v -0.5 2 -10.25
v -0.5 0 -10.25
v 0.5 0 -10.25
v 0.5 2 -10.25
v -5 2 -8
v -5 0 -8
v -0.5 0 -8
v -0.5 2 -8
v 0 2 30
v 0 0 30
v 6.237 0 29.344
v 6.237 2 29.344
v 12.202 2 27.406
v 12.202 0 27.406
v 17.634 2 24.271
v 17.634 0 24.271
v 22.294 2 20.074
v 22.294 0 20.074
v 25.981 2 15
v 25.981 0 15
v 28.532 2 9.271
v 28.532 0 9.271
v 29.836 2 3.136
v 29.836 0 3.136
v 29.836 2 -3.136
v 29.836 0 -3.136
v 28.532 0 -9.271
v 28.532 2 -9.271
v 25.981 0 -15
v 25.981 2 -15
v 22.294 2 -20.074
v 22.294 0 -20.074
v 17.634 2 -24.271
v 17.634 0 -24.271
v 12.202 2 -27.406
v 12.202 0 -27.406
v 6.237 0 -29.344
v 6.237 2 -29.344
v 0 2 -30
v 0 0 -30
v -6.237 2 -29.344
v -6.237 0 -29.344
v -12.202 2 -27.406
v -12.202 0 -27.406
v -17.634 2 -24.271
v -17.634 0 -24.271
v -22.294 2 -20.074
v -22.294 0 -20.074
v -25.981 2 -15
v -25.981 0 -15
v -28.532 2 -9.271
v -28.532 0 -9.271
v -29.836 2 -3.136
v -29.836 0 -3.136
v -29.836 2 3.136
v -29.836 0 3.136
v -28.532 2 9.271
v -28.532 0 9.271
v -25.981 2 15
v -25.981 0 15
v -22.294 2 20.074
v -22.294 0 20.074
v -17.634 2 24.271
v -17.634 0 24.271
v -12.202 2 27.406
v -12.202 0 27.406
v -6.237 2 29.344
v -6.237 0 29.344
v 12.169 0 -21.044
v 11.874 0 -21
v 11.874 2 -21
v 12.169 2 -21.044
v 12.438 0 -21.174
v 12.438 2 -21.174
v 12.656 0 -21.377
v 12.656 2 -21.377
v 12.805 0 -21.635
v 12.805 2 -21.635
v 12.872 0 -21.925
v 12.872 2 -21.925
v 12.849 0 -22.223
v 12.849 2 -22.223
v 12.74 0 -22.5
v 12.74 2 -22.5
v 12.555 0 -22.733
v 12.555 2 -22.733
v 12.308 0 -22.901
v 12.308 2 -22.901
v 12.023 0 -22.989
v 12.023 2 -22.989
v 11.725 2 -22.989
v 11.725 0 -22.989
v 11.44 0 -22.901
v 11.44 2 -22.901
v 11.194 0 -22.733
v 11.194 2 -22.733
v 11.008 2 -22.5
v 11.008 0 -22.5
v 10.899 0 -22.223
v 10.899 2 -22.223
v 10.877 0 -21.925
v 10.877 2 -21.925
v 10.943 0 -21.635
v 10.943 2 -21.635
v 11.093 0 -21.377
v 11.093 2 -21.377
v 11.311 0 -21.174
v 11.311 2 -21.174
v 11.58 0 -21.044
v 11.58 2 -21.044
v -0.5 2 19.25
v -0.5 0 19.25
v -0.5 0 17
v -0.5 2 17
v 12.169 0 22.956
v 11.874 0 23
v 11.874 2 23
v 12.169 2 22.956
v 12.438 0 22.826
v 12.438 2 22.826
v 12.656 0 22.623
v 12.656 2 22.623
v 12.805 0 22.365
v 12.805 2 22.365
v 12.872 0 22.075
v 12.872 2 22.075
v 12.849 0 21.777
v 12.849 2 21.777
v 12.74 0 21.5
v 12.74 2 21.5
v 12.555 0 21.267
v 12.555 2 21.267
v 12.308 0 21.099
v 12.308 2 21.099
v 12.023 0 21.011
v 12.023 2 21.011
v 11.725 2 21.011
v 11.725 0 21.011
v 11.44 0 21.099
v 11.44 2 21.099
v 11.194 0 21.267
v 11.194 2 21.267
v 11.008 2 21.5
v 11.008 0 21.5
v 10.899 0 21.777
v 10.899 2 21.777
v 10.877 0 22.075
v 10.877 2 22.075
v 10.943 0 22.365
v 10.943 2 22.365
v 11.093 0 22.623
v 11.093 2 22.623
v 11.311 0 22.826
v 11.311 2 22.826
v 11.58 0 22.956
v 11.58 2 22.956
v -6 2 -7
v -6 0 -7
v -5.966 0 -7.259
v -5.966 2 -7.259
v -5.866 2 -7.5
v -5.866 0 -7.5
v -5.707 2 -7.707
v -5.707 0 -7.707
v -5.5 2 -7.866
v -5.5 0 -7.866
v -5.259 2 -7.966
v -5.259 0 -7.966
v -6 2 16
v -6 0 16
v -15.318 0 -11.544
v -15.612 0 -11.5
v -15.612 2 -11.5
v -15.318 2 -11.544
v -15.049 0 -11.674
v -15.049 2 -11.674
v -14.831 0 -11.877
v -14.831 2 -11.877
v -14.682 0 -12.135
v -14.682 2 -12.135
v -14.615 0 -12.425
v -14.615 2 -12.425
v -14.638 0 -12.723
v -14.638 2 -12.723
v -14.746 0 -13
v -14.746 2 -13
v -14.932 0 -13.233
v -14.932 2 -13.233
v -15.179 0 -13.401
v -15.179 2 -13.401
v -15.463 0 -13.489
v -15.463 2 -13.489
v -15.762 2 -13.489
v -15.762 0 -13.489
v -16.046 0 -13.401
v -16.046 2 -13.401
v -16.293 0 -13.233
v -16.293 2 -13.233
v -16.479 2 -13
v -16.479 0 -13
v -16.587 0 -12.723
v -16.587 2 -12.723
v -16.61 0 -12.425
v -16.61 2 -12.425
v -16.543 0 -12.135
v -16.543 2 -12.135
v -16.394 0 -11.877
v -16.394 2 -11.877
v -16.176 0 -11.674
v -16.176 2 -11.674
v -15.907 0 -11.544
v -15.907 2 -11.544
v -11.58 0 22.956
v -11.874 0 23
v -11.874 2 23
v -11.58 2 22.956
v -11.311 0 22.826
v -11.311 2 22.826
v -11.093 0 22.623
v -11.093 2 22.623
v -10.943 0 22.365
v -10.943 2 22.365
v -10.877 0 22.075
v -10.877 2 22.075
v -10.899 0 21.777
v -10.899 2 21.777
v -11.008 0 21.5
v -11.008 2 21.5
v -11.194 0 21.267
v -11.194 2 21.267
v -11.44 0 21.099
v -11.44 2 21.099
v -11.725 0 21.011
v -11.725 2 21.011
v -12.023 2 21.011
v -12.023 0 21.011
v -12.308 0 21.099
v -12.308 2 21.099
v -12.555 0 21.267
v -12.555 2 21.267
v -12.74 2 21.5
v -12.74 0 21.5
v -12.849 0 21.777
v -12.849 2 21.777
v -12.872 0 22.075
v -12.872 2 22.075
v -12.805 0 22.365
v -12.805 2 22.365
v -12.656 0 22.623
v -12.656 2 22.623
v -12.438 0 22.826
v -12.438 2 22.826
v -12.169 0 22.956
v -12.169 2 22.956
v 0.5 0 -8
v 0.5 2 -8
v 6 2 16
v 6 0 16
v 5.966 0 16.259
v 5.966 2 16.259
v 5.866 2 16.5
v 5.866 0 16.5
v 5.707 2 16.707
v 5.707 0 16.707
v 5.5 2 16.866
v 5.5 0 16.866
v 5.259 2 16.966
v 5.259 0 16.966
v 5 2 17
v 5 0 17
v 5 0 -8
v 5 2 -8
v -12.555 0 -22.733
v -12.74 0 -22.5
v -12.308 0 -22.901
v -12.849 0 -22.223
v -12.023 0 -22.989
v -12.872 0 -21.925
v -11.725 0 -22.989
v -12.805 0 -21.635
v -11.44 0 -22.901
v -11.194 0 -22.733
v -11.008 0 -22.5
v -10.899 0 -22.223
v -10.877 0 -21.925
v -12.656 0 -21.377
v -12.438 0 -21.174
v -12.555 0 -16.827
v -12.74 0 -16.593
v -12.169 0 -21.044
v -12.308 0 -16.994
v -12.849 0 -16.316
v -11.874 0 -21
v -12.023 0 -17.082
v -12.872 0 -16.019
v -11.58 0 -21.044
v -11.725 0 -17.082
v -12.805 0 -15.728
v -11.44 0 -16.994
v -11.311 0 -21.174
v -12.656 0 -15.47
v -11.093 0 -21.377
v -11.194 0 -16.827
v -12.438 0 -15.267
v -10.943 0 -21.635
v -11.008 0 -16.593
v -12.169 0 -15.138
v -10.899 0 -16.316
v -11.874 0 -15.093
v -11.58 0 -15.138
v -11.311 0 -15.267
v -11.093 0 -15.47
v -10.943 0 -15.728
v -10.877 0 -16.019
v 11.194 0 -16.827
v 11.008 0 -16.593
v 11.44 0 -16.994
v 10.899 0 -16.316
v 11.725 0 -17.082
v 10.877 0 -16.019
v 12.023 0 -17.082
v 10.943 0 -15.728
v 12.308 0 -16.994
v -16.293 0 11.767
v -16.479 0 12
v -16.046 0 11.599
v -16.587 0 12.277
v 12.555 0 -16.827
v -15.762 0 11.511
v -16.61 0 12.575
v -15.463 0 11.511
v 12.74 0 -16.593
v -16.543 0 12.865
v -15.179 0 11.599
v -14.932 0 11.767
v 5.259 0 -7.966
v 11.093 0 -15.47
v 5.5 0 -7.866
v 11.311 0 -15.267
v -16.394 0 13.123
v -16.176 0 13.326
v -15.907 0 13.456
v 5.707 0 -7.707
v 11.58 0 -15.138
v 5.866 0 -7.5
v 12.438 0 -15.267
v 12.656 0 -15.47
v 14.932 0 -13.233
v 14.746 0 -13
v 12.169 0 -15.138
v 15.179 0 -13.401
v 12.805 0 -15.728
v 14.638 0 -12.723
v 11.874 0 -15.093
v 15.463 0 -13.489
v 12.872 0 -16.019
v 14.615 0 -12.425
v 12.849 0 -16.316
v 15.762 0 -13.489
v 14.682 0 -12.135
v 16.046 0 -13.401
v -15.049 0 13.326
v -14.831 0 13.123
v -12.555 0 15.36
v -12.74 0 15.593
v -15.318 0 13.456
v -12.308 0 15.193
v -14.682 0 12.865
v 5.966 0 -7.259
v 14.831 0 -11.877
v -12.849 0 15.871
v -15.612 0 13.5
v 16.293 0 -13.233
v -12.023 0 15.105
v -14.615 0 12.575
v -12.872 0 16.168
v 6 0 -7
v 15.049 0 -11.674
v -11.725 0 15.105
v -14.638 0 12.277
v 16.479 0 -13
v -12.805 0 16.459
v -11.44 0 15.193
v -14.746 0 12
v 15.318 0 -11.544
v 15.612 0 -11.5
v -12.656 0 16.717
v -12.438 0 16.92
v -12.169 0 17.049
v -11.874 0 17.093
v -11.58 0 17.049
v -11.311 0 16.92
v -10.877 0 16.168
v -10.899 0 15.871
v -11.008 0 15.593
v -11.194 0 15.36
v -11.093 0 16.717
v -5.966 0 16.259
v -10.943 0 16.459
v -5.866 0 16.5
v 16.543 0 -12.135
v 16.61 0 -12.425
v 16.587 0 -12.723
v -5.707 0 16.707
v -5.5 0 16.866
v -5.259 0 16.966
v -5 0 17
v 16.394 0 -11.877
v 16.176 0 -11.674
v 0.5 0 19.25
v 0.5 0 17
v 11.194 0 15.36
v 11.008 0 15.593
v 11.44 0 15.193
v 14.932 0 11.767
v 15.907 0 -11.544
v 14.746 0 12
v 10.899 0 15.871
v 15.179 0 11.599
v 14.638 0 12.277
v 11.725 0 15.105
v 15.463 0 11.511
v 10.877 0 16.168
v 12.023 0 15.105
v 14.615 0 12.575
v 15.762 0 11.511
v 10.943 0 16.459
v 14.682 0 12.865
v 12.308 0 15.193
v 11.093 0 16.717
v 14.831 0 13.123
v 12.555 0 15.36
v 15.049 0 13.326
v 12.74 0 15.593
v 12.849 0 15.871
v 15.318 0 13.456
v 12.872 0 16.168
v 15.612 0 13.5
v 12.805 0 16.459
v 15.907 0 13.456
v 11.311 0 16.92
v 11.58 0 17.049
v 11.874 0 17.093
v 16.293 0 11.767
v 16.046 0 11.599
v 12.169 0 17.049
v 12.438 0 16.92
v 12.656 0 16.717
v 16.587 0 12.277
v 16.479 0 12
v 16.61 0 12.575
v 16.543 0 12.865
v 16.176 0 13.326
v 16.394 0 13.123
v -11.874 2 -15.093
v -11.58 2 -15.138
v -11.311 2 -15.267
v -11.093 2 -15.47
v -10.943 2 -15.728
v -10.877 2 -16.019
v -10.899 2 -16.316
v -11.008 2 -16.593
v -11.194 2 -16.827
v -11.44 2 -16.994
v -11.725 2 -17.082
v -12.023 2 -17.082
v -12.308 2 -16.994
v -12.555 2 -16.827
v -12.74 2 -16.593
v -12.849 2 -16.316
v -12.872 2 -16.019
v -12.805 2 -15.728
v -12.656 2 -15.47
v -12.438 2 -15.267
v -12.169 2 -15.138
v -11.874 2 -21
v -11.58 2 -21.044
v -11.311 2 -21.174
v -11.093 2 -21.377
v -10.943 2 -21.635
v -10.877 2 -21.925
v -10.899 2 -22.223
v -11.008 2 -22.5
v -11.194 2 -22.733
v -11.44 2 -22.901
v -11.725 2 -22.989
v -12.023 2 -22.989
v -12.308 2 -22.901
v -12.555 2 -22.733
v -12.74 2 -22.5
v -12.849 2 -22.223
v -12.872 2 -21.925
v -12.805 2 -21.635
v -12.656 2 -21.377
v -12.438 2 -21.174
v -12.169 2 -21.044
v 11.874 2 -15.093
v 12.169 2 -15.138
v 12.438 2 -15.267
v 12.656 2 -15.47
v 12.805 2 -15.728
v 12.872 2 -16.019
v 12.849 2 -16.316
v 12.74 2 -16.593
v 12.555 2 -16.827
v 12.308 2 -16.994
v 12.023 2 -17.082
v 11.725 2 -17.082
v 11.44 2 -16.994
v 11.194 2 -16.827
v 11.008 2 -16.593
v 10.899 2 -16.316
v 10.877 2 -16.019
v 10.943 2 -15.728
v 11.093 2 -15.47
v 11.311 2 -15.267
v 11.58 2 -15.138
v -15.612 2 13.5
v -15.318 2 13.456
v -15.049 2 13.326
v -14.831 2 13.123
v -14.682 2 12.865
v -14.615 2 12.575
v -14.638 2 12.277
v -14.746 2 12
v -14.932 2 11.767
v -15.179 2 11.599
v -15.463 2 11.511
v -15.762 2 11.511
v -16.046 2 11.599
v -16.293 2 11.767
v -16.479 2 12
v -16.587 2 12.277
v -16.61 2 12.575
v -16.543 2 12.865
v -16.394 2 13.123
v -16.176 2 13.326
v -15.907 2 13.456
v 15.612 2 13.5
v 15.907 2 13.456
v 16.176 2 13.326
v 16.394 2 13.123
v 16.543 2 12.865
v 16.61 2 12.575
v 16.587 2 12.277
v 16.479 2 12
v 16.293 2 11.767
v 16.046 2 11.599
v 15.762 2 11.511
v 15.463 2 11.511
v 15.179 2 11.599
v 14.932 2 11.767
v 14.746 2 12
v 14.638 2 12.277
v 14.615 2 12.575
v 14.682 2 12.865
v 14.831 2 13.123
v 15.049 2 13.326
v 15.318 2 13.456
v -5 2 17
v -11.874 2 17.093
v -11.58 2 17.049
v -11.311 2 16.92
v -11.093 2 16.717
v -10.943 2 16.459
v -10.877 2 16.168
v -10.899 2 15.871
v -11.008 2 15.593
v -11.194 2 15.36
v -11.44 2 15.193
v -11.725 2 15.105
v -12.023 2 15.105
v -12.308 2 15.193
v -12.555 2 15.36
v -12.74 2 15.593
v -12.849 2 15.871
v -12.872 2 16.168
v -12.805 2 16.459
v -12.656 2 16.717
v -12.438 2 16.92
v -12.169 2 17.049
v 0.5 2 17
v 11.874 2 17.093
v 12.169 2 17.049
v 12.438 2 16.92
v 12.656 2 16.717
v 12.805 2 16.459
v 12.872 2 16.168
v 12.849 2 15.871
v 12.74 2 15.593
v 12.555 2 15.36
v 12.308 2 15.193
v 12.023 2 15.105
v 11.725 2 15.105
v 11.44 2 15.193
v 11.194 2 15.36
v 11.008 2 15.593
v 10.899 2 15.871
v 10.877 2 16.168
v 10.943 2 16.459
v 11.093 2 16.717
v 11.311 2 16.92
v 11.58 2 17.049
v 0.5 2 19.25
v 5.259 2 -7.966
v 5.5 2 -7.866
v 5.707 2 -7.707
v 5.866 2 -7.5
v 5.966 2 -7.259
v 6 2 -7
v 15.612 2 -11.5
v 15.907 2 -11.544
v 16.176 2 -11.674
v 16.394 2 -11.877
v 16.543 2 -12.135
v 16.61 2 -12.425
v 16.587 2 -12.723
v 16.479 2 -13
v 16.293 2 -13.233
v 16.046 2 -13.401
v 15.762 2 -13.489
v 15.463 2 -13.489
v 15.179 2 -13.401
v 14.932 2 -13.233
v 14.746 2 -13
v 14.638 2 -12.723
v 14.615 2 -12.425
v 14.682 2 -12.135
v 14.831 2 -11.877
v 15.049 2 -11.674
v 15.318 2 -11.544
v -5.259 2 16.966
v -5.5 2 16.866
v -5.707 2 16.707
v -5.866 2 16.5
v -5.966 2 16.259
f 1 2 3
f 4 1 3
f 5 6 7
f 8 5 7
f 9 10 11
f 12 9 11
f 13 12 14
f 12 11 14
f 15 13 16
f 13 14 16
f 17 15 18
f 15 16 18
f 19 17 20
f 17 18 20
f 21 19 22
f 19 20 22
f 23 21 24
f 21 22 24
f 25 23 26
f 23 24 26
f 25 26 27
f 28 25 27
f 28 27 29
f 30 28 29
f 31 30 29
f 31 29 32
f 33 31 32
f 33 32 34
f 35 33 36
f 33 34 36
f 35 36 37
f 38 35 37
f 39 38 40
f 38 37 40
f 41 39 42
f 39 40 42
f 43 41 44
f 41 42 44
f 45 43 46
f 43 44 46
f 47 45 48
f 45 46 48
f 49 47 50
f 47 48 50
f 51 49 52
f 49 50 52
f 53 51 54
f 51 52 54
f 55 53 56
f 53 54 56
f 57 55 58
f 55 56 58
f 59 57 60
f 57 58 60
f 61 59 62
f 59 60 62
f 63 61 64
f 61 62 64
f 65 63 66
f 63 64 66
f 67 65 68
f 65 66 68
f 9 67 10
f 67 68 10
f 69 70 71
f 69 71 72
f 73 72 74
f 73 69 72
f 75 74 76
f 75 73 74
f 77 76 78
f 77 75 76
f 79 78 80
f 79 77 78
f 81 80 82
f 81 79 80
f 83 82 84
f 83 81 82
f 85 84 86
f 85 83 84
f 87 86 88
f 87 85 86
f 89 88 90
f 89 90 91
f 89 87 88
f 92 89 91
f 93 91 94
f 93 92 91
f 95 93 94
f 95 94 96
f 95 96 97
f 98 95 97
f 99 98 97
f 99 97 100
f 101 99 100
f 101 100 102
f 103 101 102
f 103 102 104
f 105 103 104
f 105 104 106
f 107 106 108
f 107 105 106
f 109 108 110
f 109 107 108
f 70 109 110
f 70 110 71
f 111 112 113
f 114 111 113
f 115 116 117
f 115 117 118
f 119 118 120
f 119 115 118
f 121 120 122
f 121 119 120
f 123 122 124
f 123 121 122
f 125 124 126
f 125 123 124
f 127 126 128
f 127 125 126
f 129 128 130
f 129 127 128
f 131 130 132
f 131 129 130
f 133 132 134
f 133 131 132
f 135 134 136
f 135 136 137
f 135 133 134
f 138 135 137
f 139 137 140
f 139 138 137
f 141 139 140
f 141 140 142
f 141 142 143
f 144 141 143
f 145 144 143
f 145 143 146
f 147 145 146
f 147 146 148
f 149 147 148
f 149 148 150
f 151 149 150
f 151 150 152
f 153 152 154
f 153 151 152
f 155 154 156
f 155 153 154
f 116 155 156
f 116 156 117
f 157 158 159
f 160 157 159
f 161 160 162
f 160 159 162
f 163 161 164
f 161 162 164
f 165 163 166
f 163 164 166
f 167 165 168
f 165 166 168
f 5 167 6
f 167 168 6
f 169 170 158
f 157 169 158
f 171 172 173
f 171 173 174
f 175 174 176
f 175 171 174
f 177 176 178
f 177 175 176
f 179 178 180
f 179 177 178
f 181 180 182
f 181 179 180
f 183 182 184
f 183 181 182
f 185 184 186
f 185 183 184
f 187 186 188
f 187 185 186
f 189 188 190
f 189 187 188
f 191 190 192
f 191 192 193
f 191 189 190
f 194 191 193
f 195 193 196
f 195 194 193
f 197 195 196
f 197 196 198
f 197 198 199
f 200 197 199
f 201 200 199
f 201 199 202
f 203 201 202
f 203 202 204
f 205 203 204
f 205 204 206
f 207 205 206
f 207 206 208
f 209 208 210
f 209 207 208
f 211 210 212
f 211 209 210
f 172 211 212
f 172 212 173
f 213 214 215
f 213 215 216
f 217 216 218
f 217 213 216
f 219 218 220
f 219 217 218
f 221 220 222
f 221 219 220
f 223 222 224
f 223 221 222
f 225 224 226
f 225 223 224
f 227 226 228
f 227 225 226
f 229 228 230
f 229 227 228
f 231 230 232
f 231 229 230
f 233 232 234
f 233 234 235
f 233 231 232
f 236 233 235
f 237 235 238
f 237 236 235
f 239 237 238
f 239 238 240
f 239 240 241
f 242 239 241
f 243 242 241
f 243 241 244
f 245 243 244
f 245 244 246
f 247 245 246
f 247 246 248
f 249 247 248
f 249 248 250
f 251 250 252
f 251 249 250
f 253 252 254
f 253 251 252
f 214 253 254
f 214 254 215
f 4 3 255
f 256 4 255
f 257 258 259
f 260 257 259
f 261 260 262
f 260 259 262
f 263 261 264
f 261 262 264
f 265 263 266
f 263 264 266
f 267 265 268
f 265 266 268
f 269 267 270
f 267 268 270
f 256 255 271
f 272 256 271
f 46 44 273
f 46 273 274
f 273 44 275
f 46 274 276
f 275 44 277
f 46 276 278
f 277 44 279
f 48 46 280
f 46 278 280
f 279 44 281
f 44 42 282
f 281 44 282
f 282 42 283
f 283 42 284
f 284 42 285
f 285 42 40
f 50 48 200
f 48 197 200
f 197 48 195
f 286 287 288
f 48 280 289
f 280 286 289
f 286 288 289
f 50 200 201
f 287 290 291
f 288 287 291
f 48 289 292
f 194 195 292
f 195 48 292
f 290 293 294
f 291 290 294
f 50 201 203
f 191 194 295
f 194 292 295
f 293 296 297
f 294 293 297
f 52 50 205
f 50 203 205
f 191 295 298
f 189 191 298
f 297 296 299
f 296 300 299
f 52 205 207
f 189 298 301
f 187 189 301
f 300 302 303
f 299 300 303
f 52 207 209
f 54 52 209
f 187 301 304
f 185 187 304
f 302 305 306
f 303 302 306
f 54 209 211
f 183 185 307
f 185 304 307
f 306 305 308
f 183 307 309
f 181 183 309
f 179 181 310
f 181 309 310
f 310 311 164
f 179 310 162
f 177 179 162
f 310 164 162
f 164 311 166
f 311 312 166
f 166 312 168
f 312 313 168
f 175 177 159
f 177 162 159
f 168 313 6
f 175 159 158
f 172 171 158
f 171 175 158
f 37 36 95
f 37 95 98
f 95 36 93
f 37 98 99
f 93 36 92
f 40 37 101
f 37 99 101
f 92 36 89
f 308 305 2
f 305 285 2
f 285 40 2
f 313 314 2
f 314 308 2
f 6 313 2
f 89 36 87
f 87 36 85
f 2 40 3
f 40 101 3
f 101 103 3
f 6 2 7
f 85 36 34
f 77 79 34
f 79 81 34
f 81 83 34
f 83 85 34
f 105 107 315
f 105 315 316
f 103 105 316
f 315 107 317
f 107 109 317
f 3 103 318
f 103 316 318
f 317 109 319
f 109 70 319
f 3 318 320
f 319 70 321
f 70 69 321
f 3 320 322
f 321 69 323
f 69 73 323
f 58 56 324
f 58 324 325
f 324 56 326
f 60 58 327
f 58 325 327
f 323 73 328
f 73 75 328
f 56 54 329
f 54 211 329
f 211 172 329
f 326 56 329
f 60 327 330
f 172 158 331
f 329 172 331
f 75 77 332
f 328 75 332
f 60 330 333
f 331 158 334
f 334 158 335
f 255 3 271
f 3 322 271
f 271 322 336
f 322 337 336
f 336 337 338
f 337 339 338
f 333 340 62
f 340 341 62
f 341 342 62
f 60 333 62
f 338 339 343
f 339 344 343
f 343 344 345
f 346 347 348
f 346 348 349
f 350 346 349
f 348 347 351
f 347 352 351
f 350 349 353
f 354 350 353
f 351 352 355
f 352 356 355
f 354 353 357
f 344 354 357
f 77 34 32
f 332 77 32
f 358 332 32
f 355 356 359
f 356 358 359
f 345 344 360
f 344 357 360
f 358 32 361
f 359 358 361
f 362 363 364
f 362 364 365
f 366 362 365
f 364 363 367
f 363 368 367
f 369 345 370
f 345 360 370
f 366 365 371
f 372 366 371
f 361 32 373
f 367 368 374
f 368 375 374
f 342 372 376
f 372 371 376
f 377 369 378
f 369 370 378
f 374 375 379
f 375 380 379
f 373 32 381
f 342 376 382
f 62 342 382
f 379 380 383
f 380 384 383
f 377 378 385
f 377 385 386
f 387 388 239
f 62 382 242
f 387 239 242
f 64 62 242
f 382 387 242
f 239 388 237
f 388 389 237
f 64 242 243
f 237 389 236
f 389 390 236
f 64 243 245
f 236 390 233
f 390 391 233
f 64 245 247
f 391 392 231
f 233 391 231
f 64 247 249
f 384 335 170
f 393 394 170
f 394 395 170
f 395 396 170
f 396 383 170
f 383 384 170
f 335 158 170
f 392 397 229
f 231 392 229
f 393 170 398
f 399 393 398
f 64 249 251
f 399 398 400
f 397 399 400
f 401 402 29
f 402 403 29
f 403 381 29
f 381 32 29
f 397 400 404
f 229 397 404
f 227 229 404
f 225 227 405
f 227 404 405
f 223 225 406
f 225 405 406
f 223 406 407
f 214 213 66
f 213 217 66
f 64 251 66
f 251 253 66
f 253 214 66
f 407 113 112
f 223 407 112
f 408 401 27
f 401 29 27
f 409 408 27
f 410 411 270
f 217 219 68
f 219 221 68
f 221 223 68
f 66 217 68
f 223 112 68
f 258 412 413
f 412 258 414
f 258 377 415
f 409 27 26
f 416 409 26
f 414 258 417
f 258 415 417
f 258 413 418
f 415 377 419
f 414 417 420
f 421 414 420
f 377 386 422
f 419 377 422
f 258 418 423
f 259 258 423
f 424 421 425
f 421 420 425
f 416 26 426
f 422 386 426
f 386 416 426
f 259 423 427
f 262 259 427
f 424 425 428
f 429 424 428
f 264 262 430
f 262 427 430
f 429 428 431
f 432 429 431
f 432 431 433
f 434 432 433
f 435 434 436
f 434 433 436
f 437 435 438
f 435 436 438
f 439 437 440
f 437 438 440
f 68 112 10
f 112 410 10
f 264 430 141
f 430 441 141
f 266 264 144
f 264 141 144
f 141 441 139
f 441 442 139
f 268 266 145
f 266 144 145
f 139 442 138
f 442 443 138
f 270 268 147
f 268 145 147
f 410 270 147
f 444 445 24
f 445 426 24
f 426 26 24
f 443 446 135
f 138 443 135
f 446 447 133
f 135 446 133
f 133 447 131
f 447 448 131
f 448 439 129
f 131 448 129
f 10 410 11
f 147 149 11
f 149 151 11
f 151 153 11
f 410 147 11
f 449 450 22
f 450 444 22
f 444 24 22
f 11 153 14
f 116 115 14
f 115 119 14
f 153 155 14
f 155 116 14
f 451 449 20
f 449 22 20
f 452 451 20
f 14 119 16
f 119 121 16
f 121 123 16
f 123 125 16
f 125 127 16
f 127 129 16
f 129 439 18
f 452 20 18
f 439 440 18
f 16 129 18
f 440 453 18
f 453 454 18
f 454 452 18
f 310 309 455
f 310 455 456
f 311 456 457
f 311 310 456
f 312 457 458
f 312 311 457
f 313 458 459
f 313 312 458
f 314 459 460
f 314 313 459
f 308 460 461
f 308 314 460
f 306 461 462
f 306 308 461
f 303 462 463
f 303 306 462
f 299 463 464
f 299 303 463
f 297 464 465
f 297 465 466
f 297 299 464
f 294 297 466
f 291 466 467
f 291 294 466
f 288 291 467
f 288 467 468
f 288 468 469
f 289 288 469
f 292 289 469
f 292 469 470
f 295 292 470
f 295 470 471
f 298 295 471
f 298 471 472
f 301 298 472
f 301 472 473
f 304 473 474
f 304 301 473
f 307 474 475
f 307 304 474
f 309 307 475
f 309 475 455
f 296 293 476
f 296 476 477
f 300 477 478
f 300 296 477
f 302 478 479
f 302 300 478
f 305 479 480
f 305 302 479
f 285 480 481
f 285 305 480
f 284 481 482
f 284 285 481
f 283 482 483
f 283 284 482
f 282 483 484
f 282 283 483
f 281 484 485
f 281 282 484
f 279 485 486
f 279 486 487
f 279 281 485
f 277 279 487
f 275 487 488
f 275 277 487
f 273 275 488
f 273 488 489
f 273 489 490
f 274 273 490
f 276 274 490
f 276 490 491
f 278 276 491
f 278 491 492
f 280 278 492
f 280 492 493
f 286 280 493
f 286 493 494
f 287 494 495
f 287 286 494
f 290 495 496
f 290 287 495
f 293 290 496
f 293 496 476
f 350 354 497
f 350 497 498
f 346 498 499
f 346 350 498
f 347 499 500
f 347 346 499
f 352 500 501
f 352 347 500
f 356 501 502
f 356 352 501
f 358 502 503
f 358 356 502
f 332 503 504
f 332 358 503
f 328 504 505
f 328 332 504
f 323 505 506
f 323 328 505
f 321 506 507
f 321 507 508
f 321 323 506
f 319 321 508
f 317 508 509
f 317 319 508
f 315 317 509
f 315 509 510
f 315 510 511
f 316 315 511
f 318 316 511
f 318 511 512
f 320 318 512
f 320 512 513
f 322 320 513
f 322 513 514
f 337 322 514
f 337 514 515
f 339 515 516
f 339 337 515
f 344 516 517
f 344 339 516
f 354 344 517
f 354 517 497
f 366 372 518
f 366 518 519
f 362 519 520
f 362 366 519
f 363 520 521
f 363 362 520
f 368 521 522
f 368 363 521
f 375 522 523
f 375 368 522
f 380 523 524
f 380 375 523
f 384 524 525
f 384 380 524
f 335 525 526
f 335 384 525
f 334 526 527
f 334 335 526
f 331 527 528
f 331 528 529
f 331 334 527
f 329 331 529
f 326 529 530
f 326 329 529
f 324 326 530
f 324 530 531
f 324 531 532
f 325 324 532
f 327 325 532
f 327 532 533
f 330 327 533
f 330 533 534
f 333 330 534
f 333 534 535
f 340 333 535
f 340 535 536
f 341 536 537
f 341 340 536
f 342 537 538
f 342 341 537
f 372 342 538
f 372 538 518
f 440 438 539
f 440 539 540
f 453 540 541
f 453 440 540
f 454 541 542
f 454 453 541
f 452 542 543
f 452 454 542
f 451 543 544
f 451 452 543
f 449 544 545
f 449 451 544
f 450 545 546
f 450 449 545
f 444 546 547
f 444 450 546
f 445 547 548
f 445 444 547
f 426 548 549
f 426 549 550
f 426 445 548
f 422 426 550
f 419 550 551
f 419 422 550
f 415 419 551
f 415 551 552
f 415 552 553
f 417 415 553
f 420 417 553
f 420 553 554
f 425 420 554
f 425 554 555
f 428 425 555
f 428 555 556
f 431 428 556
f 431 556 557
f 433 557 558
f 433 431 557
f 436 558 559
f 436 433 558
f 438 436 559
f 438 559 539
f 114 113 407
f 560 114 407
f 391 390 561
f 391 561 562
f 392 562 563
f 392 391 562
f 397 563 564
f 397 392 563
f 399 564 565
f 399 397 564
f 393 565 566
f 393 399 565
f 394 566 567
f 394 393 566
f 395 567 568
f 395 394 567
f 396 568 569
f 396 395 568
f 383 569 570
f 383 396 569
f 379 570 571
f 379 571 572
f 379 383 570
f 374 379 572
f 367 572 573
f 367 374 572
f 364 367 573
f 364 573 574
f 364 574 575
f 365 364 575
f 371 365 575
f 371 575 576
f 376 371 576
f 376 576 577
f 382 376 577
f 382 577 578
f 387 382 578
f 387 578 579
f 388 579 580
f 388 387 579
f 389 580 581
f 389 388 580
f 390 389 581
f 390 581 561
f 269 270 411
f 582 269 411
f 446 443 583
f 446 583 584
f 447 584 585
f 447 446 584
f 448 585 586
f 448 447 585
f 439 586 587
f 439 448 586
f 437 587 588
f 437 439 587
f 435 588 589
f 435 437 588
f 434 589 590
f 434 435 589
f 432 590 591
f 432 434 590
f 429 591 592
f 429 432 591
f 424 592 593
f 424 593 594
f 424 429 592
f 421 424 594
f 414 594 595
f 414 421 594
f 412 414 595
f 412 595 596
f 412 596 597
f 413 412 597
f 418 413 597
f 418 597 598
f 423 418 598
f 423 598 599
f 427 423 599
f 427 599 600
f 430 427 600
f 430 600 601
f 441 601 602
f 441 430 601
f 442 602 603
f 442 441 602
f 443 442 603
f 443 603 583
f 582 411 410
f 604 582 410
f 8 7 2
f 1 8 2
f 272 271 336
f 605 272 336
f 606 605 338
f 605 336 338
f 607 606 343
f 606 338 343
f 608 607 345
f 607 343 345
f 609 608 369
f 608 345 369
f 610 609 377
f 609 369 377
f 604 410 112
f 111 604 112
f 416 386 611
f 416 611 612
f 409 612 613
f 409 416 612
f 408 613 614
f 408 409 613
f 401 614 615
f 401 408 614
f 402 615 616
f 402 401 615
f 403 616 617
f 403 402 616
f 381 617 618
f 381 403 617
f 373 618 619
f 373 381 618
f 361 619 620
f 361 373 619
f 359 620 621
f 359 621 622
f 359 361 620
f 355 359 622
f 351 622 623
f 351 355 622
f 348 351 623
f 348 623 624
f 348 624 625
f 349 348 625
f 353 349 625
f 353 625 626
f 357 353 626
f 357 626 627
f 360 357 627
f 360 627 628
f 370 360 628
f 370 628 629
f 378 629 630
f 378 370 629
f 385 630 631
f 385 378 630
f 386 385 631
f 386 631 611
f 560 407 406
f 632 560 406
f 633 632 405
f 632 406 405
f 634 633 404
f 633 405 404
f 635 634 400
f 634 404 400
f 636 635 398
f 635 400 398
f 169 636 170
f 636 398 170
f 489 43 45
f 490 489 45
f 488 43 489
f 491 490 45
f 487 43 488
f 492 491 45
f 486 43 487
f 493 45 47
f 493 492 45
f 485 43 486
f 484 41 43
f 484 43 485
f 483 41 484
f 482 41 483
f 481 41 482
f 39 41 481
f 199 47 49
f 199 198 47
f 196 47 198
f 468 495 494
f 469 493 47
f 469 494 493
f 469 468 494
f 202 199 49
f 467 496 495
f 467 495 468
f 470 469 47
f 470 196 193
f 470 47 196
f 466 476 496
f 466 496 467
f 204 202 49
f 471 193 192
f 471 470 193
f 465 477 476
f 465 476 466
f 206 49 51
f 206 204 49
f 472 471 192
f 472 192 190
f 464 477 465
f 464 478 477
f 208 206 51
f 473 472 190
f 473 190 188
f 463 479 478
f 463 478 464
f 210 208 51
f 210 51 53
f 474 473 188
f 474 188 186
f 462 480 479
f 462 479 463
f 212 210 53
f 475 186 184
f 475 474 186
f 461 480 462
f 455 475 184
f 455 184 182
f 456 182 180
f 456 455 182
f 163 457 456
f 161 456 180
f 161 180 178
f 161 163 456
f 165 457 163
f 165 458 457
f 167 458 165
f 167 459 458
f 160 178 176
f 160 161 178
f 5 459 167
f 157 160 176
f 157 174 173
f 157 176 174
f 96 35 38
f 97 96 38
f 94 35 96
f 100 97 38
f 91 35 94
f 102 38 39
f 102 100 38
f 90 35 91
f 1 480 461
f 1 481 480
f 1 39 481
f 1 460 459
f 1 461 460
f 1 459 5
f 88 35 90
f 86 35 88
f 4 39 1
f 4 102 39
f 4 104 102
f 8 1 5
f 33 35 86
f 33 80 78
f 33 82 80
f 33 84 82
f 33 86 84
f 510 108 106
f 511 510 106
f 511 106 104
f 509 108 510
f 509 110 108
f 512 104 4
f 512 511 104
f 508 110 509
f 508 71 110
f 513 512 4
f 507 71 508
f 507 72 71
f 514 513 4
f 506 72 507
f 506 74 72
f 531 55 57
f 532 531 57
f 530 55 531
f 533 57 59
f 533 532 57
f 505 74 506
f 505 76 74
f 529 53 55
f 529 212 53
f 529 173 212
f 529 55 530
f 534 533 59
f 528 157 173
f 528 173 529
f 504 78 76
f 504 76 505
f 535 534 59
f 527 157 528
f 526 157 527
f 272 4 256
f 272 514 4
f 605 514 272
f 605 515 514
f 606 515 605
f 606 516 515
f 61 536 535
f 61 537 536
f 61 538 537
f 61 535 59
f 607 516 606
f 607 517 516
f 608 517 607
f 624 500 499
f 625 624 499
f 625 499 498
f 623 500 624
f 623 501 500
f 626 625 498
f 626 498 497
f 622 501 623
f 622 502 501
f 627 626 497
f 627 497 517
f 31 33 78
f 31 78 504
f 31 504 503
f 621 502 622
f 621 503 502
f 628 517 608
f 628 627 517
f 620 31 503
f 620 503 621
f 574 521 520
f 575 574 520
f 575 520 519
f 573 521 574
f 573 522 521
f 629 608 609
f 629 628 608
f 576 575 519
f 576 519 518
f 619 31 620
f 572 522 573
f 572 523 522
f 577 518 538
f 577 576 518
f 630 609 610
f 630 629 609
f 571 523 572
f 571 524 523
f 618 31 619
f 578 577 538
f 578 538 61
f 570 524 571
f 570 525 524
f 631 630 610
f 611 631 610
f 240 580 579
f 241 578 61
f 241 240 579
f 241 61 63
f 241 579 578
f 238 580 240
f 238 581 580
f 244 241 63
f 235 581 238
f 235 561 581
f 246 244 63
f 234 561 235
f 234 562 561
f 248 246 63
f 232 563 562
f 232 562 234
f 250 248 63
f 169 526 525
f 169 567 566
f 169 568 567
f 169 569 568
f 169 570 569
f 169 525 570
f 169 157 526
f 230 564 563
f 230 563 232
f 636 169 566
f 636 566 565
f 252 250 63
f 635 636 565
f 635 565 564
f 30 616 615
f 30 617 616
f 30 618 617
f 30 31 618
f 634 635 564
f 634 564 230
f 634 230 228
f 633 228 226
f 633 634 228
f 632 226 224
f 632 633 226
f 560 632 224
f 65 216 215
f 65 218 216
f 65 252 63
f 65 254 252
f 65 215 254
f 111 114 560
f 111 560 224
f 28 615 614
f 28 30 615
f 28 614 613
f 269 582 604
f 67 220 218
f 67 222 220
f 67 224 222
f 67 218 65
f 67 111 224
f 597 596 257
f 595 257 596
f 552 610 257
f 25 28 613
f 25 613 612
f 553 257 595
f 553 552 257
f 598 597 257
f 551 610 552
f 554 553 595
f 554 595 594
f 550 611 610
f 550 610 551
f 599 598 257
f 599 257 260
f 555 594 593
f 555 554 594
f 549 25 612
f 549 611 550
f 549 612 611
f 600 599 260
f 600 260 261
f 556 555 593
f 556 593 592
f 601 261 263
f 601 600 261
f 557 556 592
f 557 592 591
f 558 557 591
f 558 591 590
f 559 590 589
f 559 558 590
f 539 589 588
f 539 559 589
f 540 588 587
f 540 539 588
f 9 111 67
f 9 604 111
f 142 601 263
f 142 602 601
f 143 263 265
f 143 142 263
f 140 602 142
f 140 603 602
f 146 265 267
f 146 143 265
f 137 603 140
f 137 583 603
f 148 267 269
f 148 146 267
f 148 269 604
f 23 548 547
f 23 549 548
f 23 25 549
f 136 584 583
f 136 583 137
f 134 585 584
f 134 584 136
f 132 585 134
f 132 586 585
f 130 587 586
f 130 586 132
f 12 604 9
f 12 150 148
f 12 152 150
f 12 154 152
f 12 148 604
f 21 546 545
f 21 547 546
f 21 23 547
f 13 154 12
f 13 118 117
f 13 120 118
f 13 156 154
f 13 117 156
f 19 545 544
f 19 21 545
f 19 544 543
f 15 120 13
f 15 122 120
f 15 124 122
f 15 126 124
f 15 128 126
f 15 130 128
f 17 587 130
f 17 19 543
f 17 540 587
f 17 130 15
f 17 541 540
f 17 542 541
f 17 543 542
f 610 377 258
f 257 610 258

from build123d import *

# Parameters (mm, degrees)
SKETCH1_R               = 30
SKETCH1_R_2             = 1
BOSS_EXTRUDE1_DEPTH     = 2
CUT_EXTRUDE1_DEPTH      = 43.473521163
CUT_EXTRUDE1_DEPTH_BACK = 43.473521163


with BuildPart() as part:
    # Sketch1 → Boss-Extrude1 (new body)
    with BuildSketch(Plane(origin=(0, 0, 0), x_dir=(1, 0, 0), z_dir=(0, 1, 0))):
        with Locations(Location((0, 0, 0), (0, 0, 270))):
            Circle(SKETCH1_R)
        with Locations(Location((-11.874342087, 22, 0), (0, 0, 270))):
            Circle(SKETCH1_R_2, mode=Mode.SUBTRACT)
        with Locations(Location((11.874342087, 22, 0), (0, 0, 270))):
            Circle(SKETCH1_R_2, mode=Mode.SUBTRACT)
        with Locations(Location((11.874342087, -22, 0), (0, 0, 270))):
            Circle(SKETCH1_R_2, mode=Mode.SUBTRACT)
        with Locations(Location((-11.874342087, -22, 0), (0, 0, 270))):
            Circle(SKETCH1_R_2, mode=Mode.SUBTRACT)
        with Locations(Location((-11.874342087, 16.093476939, 0), (0, 0, 270))):
            Circle(SKETCH1_R_2, mode=Mode.SUBTRACT)
        with Locations(Location((11.874342087, 16.093476939, 0), (0, 0, 270))):
            Circle(SKETCH1_R_2, mode=Mode.SUBTRACT)
        with Locations(Location((11.874342087, -16.093476939, 0), (0, 0, 270))):
            Circle(SKETCH1_R_2, mode=Mode.SUBTRACT)
        with Locations(Location((-11.874342087, -16.093476939, 0), (0, 0, 270))):
            Circle(SKETCH1_R_2, mode=Mode.SUBTRACT)
        with Locations(Location((-15.612494996, 12.5, 0), (0, 0, 270))):
            Circle(SKETCH1_R_2, mode=Mode.SUBTRACT)
        with Locations(Location((15.612494996, 12.5, 0), (0, 0, 270))):
            Circle(SKETCH1_R_2, mode=Mode.SUBTRACT)
        with Locations(Location((15.612494996, -12.5, 0), (0, 0, 270))):
            Circle(SKETCH1_R_2, mode=Mode.SUBTRACT)
        with Locations(Location((-15.612494996, -12.5, 0), (0, 0, 270))):
            Circle(SKETCH1_R_2, mode=Mode.SUBTRACT)
    extrude(amount=BOSS_EXTRUDE1_DEPTH)

    # Sketch2 → Cut-Extrude1 (cut, two sides: drawn at the far end of the back side and taken through both)
    with BuildSketch(Plane(origin=(0, 2, 0), x_dir=(1, 0, 0), z_dir=(0, 1, 0)).offset(-CUT_EXTRUDE1_DEPTH_BACK)):
        with BuildLine():
            Line((-5, 8), (-0.5, 8))
            Line((-0.5, 8), (-0.5, 10.25))
            Line((-0.5, 10.25), (0.5, 10.25))
            Line((0.5, 10.25), (0.5, 8))
            Line((0.5, 8), (5, 8))
            ThreePointArc((5, 8), (5.707106781, 7.707106781), (6, 7))
            Line((6, 7), (6, -16))
            ThreePointArc((6, -16), (5.707106781, -16.707106781), (5, -17))
            Line((5, -17), (0.5, -17))
            Line((0.5, -17), (0.5, -19.25))
            Line((0.5, -19.25), (-0.5, -19.25))
            Line((-0.5, -19.25), (-0.5, -17))
            Line((-0.5, -17), (-5, -17))
            ThreePointArc((-5, -17), (-5.707106781, -16.707106781), (-6, -16))
            Line((-6, -16), (-6, 7))
            ThreePointArc((-6, 7), (-5.707106781, 7.707106781), (-5, 8))
        make_face()
    extrude(amount=CUT_EXTRUDE1_DEPTH + CUT_EXTRUDE1_DEPTH_BACK, mode=Mode.SUBTRACT)


solid = part.part
